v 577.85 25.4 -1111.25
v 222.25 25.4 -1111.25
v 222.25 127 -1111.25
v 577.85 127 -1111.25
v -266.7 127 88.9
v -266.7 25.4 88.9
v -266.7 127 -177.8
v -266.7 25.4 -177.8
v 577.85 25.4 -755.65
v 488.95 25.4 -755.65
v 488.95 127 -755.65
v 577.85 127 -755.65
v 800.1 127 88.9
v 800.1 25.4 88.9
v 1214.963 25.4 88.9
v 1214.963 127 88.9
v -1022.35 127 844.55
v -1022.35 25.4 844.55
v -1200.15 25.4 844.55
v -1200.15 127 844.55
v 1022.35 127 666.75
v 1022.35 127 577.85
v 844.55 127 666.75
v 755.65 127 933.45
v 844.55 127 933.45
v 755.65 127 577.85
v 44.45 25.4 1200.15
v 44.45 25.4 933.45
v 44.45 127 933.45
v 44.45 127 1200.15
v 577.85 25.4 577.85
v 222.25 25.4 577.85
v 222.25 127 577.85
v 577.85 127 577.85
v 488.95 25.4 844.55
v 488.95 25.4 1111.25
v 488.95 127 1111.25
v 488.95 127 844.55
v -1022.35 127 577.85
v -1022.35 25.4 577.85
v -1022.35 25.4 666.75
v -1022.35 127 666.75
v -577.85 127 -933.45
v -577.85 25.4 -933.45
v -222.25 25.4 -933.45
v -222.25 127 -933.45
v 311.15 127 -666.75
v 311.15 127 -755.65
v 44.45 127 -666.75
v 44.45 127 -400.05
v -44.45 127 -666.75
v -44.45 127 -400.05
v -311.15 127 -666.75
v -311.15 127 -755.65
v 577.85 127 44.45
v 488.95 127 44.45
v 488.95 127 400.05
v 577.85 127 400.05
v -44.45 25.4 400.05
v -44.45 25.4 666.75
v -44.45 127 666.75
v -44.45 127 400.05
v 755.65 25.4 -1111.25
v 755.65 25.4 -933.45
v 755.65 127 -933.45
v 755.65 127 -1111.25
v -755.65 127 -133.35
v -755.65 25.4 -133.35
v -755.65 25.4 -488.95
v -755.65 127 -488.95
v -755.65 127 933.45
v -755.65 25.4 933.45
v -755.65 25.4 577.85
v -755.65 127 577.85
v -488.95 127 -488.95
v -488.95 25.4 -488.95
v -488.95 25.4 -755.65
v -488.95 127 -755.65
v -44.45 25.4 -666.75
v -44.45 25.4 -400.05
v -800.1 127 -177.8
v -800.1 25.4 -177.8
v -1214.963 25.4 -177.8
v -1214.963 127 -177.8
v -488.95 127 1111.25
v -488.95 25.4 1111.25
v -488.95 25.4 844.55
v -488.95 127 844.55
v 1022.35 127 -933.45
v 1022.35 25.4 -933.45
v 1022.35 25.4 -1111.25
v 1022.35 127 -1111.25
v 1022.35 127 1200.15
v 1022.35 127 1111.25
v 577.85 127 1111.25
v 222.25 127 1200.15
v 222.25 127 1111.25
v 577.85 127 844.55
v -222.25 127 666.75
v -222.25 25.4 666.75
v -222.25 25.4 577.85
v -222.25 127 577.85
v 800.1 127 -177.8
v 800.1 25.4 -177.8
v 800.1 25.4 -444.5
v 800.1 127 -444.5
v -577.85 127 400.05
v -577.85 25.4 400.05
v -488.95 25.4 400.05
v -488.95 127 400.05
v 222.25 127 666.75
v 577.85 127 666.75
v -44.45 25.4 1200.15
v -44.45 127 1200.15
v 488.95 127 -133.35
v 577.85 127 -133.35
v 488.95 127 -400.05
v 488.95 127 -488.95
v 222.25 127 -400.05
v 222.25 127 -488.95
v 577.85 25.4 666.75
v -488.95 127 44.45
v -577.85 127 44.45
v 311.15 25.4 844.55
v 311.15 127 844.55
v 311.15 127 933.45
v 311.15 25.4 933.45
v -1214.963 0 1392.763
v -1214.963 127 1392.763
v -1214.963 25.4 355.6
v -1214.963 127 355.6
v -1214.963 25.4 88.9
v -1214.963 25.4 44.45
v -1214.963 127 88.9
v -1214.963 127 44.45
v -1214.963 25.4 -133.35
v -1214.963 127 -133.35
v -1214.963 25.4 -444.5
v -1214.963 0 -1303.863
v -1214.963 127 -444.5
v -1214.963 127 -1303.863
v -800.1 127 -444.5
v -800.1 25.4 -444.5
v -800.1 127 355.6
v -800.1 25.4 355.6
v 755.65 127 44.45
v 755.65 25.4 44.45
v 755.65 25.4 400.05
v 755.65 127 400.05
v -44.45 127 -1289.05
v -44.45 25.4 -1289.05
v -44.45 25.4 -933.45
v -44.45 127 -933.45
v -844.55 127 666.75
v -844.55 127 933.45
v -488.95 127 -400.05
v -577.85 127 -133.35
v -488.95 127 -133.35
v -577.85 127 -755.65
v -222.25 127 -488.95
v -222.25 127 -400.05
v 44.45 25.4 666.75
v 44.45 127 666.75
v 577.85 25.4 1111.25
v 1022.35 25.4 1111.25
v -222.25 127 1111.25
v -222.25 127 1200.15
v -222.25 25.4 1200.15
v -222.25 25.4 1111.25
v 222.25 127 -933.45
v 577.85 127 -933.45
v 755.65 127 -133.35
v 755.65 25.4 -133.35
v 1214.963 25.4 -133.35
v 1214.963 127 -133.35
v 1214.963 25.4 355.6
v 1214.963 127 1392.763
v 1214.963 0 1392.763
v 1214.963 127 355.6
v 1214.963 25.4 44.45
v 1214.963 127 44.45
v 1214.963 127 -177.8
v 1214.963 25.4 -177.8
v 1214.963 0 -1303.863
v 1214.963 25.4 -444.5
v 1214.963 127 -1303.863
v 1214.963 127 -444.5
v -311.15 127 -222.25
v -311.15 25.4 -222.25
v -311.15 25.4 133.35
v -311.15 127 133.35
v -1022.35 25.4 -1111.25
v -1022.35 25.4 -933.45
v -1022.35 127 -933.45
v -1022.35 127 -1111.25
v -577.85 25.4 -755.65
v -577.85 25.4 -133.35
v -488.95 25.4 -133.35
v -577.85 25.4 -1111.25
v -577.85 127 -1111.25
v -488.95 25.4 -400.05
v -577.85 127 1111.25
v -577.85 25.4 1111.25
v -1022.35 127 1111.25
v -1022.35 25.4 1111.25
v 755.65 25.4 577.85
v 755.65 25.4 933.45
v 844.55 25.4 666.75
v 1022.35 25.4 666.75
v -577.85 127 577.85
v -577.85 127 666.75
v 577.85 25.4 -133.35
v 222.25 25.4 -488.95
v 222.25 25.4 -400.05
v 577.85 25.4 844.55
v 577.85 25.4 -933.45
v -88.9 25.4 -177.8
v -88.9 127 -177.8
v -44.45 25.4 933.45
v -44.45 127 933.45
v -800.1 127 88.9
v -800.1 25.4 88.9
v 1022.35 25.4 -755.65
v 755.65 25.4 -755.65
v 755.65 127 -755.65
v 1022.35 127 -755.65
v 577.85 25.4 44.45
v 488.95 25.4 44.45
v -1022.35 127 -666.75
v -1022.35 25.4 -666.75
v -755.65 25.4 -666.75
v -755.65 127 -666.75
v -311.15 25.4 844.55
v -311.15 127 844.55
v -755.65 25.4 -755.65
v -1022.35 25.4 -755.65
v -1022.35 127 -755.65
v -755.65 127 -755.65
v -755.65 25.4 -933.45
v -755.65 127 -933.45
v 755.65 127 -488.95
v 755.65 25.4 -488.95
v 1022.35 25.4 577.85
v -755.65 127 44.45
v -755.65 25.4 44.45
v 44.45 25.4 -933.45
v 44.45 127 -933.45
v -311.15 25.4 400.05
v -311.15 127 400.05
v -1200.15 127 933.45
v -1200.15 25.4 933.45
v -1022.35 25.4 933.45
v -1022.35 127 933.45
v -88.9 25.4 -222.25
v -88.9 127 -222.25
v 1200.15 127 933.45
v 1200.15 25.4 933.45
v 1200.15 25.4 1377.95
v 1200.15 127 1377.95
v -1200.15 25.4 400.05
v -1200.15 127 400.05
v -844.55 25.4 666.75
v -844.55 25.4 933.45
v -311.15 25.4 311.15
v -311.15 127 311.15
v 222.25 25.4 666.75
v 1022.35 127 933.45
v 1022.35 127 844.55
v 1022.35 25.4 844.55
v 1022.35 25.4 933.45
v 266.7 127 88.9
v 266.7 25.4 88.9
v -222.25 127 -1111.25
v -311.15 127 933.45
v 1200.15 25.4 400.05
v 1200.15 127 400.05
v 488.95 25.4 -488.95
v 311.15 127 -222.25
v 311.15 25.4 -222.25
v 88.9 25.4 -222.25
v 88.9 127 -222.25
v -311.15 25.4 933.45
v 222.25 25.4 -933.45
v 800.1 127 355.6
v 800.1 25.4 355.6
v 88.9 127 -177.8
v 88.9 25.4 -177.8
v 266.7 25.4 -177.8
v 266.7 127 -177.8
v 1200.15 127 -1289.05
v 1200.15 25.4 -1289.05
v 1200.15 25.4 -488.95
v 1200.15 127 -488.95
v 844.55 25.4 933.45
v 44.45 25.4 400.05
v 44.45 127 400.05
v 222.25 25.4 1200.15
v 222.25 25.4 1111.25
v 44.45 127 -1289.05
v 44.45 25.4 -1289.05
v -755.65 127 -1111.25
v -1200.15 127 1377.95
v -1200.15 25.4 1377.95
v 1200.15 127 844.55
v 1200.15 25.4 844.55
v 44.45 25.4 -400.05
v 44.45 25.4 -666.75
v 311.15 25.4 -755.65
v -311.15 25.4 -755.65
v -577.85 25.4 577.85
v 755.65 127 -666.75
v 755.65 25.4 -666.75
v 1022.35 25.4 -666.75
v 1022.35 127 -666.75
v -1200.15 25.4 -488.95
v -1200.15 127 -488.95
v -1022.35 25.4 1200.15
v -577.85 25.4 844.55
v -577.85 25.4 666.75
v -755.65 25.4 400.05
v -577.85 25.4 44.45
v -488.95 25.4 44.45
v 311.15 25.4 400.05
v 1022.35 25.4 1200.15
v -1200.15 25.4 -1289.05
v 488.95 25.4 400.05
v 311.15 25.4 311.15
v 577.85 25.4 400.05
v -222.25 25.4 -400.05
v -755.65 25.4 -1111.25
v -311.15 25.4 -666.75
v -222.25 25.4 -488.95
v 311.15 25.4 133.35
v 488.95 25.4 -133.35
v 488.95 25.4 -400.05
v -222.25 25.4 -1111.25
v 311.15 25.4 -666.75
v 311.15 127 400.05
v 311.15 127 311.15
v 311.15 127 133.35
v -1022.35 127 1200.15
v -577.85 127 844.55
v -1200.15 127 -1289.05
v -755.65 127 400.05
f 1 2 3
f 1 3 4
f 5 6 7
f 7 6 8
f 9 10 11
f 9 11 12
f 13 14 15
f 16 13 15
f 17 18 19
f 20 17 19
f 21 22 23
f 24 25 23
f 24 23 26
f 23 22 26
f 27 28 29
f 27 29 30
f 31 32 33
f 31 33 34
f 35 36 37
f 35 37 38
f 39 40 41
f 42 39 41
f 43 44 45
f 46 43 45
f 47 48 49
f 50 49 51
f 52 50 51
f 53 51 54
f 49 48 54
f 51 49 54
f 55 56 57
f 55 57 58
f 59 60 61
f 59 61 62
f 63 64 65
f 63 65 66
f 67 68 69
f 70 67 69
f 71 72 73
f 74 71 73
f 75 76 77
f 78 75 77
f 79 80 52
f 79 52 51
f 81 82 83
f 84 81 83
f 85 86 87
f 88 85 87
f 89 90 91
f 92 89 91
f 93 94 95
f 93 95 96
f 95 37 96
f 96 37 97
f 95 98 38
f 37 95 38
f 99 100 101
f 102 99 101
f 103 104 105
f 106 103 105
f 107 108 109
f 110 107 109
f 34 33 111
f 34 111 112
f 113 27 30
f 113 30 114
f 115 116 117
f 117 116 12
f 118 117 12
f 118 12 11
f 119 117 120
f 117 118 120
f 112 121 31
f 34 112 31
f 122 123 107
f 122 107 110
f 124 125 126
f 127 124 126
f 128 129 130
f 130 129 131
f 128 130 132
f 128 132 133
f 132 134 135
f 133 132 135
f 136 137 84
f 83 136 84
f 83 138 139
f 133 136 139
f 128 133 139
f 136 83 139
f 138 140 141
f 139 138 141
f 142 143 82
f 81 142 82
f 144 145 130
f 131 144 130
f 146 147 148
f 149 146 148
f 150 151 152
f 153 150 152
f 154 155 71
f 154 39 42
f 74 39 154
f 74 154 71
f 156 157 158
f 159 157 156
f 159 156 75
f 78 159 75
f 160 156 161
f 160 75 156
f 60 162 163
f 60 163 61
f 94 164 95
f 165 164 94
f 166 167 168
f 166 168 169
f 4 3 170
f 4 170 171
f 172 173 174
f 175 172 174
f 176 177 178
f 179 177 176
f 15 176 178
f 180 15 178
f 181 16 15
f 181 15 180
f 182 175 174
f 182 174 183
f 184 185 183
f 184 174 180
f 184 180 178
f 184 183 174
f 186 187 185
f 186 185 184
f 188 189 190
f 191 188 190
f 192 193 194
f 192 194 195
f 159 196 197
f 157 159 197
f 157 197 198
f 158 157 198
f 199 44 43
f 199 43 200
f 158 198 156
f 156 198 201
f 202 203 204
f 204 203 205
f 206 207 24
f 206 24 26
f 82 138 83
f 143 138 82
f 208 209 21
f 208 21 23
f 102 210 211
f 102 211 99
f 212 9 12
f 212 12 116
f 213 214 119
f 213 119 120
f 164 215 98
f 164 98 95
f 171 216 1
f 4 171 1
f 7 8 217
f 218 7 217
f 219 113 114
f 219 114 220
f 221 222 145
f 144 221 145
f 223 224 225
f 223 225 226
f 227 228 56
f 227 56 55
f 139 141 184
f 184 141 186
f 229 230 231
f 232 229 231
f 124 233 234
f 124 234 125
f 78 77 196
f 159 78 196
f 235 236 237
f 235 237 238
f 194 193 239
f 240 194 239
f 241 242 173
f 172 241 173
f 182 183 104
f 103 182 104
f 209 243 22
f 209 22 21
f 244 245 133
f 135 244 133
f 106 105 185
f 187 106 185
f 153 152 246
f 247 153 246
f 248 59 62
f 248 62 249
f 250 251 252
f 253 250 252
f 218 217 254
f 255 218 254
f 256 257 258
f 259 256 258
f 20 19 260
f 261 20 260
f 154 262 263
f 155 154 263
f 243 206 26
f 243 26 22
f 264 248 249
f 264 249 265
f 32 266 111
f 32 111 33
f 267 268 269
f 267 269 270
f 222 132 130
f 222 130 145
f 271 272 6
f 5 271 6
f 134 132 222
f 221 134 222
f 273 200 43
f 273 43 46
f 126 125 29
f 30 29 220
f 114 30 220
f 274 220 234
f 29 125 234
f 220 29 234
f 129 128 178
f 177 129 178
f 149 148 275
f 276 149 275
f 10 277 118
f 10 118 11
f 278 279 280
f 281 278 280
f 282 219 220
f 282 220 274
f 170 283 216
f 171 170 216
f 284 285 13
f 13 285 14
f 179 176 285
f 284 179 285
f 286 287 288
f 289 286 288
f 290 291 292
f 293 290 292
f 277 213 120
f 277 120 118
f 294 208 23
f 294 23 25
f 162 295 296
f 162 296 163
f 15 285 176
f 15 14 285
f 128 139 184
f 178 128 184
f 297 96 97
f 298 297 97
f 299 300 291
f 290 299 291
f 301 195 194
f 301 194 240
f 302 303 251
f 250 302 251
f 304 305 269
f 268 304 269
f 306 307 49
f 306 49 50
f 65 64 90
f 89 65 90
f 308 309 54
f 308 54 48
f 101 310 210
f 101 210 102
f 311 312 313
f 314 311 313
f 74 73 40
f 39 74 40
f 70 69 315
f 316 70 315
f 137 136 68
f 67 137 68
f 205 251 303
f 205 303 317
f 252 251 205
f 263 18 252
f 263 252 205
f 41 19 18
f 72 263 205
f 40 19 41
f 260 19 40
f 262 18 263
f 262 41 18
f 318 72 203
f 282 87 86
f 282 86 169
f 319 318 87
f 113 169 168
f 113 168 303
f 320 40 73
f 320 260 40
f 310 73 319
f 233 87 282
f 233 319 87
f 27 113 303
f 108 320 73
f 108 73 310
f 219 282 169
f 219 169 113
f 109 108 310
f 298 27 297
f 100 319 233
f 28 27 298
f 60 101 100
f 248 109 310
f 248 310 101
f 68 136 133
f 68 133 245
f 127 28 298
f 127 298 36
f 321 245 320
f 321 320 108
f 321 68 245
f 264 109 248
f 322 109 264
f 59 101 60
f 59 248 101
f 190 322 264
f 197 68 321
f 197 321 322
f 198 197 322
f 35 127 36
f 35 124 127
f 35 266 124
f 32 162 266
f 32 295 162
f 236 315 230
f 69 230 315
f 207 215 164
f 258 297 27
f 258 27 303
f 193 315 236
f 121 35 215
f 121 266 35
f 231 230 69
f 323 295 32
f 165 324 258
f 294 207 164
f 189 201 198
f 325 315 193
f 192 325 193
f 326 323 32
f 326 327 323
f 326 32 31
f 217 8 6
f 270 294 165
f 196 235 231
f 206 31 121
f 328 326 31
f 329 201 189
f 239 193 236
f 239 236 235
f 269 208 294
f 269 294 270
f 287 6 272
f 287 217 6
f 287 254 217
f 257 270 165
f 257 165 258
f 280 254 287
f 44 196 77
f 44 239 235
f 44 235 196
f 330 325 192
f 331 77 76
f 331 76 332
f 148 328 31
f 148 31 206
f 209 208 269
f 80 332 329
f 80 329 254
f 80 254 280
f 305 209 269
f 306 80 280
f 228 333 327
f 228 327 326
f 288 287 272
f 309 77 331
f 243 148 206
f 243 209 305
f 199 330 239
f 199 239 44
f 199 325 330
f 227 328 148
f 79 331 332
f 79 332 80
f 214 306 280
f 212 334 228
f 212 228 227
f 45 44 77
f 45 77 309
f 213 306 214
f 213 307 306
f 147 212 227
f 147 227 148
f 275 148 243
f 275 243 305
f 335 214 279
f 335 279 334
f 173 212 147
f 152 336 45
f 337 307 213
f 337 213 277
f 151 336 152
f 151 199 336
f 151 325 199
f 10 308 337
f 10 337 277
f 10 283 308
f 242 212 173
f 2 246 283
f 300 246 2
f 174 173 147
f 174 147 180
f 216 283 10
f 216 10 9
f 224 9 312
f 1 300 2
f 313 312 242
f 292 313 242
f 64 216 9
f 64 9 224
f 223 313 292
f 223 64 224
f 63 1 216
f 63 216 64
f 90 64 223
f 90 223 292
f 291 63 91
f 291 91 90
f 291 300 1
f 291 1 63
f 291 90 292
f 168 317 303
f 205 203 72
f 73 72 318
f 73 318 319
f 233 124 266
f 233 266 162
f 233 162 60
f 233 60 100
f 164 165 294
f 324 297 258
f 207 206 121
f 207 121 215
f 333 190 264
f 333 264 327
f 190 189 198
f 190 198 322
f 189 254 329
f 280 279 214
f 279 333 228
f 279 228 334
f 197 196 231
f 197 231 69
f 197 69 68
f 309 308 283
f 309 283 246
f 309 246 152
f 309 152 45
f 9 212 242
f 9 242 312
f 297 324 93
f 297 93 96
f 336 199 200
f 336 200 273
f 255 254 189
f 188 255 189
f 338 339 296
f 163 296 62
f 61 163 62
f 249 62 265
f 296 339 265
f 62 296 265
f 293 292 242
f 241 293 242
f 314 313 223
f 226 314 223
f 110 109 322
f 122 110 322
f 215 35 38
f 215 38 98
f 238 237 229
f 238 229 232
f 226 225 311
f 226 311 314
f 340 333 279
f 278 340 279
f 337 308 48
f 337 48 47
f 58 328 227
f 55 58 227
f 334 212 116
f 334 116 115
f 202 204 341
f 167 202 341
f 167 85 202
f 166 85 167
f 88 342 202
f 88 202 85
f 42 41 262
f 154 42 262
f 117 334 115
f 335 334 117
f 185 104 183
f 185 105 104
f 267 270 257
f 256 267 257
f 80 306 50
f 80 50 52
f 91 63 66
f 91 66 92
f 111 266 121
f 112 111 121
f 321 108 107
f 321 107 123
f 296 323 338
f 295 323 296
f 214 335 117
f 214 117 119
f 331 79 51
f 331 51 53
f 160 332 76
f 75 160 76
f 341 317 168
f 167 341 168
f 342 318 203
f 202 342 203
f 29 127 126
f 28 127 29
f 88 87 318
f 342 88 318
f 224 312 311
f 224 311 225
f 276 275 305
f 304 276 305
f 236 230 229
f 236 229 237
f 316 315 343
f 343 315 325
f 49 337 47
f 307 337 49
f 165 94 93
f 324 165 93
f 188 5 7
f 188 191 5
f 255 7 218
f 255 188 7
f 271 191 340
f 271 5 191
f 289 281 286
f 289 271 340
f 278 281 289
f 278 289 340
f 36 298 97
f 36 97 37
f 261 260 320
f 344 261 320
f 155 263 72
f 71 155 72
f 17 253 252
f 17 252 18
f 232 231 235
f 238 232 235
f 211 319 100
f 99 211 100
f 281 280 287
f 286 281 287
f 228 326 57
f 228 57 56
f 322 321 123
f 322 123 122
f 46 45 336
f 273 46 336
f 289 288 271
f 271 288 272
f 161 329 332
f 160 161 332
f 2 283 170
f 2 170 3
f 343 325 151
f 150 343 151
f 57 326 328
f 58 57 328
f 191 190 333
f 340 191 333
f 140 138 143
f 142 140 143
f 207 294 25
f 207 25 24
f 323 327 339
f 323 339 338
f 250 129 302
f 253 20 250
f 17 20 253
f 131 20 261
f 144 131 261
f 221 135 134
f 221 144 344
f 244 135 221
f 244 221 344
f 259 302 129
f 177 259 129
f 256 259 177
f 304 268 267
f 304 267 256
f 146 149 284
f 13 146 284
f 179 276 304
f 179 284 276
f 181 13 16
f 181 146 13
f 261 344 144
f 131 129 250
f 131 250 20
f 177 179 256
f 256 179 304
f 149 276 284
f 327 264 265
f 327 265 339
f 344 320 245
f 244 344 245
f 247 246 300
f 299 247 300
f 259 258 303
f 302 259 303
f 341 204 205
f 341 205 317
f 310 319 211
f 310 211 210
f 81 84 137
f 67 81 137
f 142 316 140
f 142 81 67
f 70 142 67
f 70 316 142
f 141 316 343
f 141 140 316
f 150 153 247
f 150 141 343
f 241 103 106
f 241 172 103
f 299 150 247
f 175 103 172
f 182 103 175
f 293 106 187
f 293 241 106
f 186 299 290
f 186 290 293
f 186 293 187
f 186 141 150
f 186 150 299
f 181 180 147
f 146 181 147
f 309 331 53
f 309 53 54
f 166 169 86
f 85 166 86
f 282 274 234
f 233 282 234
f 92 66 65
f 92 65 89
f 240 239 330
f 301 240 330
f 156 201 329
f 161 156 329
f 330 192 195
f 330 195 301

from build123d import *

# Parameters (mm, degrees)
SKETCH1_W               = 2489.2
SKETCH1_H               = 3200.4
BOSS_EXTRUDE2_DEPTH     = 25.4
SKETCH6_W               = 266.7
SKETCH6_H               = 177.8
SKETCH6_W_2             = 355.6
SKETCH6_H_2             = 88.9
SKETCH6_W_3             = 88.9
SKETCH6_H_3             = 355.6
BOSS_EXTRUDE3_DEPTH     = 101.6
SKETCH8_W               = 2489.2
SKETCH8_H               = 296.33672
CUT_EXTRUDE1_DEPTH      = 2032.206094911
CUT_EXTRUDE2_DEPTH      = 2032.206094911
CUT_EXTRUDE2_DEPTH_BACK = 2032.206094911
SKETCH9_W               = 2489.2
SKETCH9_H               = 207.43672
SKETCH10_W              = 29.63672
SKETCH10_H              = 2696.62656
CUT_EXTRUDE3_DEPTH      = 1873.150558614
SKETCH11_W              = 29.636719999
SKETCH11_H              = 2696.62656
CUT_EXTRUDE4_DEPTH      = 1873.150558614


with BuildPart() as part:
    # Sketch1 → Boss-Extrude2 (new body)
    with BuildSketch(Plane(origin=(0, 0, 0), x_dir=(1, 0, 0), z_dir=(0, 1, 0))):
        Rectangle(SKETCH1_W, SKETCH1_H)
    extrude(amount=BOSS_EXTRUDE2_DEPTH)

    # Sketch6 → Boss-Extrude3 (add)
    with BuildSketch(Plane(origin=(0, 25.4, 0), x_dir=(1, 0, 0), z_dir=(0, 1, 0))):
        Polygon((1244.6, 1333.5), (-1244.6, 1333.5), (-1244.6, 444.5), (-800.1, 444.5), (-800.1, 177.8), (-1244.6, 177.8), (-1244.6, 133.35), (-755.65, 133.35), (-755.65, 488.95), (-1200.15, 488.95), (-1200.15, 1289.05), (-44.45, 1289.05), (-44.45, 933.45), (44.45, 933.45), (44.45, 1289.05), (1200.15, 1289.05), (1200.15, 488.95), (755.65, 488.95), (755.65, 133.35), (1244.6, 133.35), (1244.6, 177.8), (800.1, 177.8), (800.1, 444.5), (1244.6, 444.5), align=None)
        with Locations((-889, 1022.35)):
            Rectangle(SKETCH6_W, SKETCH6_H)
        with Locations((-400.05, 1022.35)):
            Rectangle(SKETCH6_W_2, SKETCH6_H)
        with Locations((400.05, 1022.35)):
            Rectangle(SKETCH6_W_2, SKETCH6_H)
        with Locations((889, 1022.35)):
            Rectangle(SKETCH6_W, SKETCH6_H)
        with Locations((889, 711.2)):
            Rectangle(SKETCH6_W, SKETCH6_H_2)
        Polygon((577.85, 755.65), (577.85, 133.35), (488.95, 133.35), (488.95, 400.05), (222.25, 400.05), (222.25, 488.95), (488.95, 488.95), (488.95, 755.65), align=None)
        Polygon((311.15, 755.65), (311.15, 666.75), (44.45, 666.75), (44.45, 400.05), (-44.45, 400.05), (-44.45, 666.75), (-311.15, 666.75), (-311.15, 755.65), align=None)
        Polygon((-488.95, 488.95), (-488.95, 755.65), (-577.85, 755.65), (-577.85, 133.35), (-488.95, 133.35), (-488.95, 400.05), (-222.25, 400.05), (-222.25, 488.95), align=None)
        with Locations((-889, 711.2)):
            Rectangle(SKETCH6_W, SKETCH6_H_2)
        Polygon((-311.15, -133.35), (311.15, -133.35), (311.15, 222.25), (88.9, 222.25), (88.9, 177.8), (266.7, 177.8), (266.7, -88.9), (-266.7, -88.9), (-266.7, 177.8), (-88.9, 177.8), (-88.9, 222.25), (-311.15, 222.25), align=None)
        with Locations((-533.4, -222.25)):
            Rectangle(SKETCH6_W_3, SKETCH6_H_3)
        Polygon((-755.65, -44.45), (-1244.6, -44.45), (-1244.6, -88.9), (-800.1, -88.9), (-800.1, -355.6), (-1244.6, -355.6), (-1244.6, -1422.4), (1244.600000001, -1422.4), (1244.6, -355.6), (800.1, -355.6), (800.1, -88.9), (1244.6, -88.9), (1244.6, -44.45), (755.65, -44.45), (755.65, -400.05), (1200.15, -400.05), (1200.15, -844.549999958), (1022.350000001, -844.549999958), (1022.350000001, -933.449999958), (1200.150000001, -933.449999958), (1200.150000001, -1377.95), (-1200.15, -1377.95), (-1200.15, -933.45), (-1022.35, -933.45), (-1022.35, -844.55), (-1200.15, -844.55), (-1200.15, -400.05), (-755.65, -400.05), align=None)
        Polygon((311.15, -400.05), (44.45, -400.05), (44.45, -666.75), (-44.45, -666.75), (-44.45, -400.05), (-311.15, -400.05), (-311.15, -311.15), (311.15, -311.15), align=None)
        with Locations((533.4, -222.25)):
            Rectangle(SKETCH6_W_3, SKETCH6_H_3)
        with Locations((400.05, -622.3)):
            Rectangle(SKETCH6_W_2, SKETCH6_H_2)
        Polygon((755.65, -577.85), (1022.35, -577.85), (1022.35, -666.75), (844.55, -666.75), (844.55, -933.45), (755.65, -933.45), align=None)
        Polygon((577.85, -1111.25), (1022.35, -1111.25), (1022.35, -1200.15), (222.25, -1200.15), (222.25, -1111.25), (488.95, -1111.25), (488.95, -844.55), (577.85, -844.55), align=None)
        Polygon((311.15, -844.55), (311.15, -933.45), (44.45, -933.45), (44.45, -1200.15), (-44.45, -1200.15), (-44.45, -933.45), (-311.15, -933.45), (-311.15, -844.55), align=None)
        Polygon((-488.95, -1111.25), (-488.95, -844.55), (-577.85, -844.55), (-577.85, -1111.25), (-1022.35, -1111.25), (-1022.35, -1200.15), (-222.25, -1200.15), (-222.25, -1111.25), align=None)
        Polygon((-844.55, -933.45), (-755.65, -933.45), (-755.65, -577.85), (-1022.35, -577.85), (-1022.35, -666.75), (-844.55, -666.75), align=None)
        with Locations((-400.05, -622.3)):
            Rectangle(SKETCH6_W_2, SKETCH6_H_2)
    extrude(amount=BOSS_EXTRUDE3_DEPTH)

    # Sketch8 → Cut-Extrude1 (cut, through all)
    with BuildSketch(Plane(origin=(0, 127, 0), x_dir=(1, 0, 0), z_dir=(0, 1, 0))):
        with Locations((0, 1452.03164)):
            Rectangle(SKETCH8_W, SKETCH8_H)
    extrude(amount=-CUT_EXTRUDE1_DEPTH, mode=Mode.SUBTRACT)

    # Sketch9 → Cut-Extrude2 (cut, two sides: drawn at the far end of the back side and taken through both)
    with BuildSketch(Plane(origin=(0, 127, 0), x_dir=(1, 0, 0), z_dir=(0, 1, 0)).offset(-CUT_EXTRUDE2_DEPTH_BACK)):
        with Locations((0, -1496.48164)):
            Rectangle(SKETCH9_W, SKETCH9_H)
    extrude(amount=CUT_EXTRUDE2_DEPTH + CUT_EXTRUDE2_DEPTH_BACK, mode=Mode.SUBTRACT)

    # Sketch10 → Cut-Extrude3 (cut, through all)
    with BuildSketch(Plane(origin=(0, 127, 0), x_dir=(1, 0, 0), z_dir=(0, 1, 0))):
        with Locations((-1229.78164, -44.45)):
            Rectangle(SKETCH10_W, SKETCH10_H)
    extrude(amount=-CUT_EXTRUDE3_DEPTH, mode=Mode.SUBTRACT)

    # Sketch11 → Cut-Extrude4 (cut, through all)
    with BuildSketch(Plane(origin=(0, 127, 0), x_dir=(1, 0, 0), z_dir=(0, 1, 0))):
        with Locations((1229.781640001, -44.45)):
            Rectangle(SKETCH11_W, SKETCH11_H)
    extrude(amount=-CUT_EXTRUDE4_DEPTH, mode=Mode.SUBTRACT)


solid = part.part
